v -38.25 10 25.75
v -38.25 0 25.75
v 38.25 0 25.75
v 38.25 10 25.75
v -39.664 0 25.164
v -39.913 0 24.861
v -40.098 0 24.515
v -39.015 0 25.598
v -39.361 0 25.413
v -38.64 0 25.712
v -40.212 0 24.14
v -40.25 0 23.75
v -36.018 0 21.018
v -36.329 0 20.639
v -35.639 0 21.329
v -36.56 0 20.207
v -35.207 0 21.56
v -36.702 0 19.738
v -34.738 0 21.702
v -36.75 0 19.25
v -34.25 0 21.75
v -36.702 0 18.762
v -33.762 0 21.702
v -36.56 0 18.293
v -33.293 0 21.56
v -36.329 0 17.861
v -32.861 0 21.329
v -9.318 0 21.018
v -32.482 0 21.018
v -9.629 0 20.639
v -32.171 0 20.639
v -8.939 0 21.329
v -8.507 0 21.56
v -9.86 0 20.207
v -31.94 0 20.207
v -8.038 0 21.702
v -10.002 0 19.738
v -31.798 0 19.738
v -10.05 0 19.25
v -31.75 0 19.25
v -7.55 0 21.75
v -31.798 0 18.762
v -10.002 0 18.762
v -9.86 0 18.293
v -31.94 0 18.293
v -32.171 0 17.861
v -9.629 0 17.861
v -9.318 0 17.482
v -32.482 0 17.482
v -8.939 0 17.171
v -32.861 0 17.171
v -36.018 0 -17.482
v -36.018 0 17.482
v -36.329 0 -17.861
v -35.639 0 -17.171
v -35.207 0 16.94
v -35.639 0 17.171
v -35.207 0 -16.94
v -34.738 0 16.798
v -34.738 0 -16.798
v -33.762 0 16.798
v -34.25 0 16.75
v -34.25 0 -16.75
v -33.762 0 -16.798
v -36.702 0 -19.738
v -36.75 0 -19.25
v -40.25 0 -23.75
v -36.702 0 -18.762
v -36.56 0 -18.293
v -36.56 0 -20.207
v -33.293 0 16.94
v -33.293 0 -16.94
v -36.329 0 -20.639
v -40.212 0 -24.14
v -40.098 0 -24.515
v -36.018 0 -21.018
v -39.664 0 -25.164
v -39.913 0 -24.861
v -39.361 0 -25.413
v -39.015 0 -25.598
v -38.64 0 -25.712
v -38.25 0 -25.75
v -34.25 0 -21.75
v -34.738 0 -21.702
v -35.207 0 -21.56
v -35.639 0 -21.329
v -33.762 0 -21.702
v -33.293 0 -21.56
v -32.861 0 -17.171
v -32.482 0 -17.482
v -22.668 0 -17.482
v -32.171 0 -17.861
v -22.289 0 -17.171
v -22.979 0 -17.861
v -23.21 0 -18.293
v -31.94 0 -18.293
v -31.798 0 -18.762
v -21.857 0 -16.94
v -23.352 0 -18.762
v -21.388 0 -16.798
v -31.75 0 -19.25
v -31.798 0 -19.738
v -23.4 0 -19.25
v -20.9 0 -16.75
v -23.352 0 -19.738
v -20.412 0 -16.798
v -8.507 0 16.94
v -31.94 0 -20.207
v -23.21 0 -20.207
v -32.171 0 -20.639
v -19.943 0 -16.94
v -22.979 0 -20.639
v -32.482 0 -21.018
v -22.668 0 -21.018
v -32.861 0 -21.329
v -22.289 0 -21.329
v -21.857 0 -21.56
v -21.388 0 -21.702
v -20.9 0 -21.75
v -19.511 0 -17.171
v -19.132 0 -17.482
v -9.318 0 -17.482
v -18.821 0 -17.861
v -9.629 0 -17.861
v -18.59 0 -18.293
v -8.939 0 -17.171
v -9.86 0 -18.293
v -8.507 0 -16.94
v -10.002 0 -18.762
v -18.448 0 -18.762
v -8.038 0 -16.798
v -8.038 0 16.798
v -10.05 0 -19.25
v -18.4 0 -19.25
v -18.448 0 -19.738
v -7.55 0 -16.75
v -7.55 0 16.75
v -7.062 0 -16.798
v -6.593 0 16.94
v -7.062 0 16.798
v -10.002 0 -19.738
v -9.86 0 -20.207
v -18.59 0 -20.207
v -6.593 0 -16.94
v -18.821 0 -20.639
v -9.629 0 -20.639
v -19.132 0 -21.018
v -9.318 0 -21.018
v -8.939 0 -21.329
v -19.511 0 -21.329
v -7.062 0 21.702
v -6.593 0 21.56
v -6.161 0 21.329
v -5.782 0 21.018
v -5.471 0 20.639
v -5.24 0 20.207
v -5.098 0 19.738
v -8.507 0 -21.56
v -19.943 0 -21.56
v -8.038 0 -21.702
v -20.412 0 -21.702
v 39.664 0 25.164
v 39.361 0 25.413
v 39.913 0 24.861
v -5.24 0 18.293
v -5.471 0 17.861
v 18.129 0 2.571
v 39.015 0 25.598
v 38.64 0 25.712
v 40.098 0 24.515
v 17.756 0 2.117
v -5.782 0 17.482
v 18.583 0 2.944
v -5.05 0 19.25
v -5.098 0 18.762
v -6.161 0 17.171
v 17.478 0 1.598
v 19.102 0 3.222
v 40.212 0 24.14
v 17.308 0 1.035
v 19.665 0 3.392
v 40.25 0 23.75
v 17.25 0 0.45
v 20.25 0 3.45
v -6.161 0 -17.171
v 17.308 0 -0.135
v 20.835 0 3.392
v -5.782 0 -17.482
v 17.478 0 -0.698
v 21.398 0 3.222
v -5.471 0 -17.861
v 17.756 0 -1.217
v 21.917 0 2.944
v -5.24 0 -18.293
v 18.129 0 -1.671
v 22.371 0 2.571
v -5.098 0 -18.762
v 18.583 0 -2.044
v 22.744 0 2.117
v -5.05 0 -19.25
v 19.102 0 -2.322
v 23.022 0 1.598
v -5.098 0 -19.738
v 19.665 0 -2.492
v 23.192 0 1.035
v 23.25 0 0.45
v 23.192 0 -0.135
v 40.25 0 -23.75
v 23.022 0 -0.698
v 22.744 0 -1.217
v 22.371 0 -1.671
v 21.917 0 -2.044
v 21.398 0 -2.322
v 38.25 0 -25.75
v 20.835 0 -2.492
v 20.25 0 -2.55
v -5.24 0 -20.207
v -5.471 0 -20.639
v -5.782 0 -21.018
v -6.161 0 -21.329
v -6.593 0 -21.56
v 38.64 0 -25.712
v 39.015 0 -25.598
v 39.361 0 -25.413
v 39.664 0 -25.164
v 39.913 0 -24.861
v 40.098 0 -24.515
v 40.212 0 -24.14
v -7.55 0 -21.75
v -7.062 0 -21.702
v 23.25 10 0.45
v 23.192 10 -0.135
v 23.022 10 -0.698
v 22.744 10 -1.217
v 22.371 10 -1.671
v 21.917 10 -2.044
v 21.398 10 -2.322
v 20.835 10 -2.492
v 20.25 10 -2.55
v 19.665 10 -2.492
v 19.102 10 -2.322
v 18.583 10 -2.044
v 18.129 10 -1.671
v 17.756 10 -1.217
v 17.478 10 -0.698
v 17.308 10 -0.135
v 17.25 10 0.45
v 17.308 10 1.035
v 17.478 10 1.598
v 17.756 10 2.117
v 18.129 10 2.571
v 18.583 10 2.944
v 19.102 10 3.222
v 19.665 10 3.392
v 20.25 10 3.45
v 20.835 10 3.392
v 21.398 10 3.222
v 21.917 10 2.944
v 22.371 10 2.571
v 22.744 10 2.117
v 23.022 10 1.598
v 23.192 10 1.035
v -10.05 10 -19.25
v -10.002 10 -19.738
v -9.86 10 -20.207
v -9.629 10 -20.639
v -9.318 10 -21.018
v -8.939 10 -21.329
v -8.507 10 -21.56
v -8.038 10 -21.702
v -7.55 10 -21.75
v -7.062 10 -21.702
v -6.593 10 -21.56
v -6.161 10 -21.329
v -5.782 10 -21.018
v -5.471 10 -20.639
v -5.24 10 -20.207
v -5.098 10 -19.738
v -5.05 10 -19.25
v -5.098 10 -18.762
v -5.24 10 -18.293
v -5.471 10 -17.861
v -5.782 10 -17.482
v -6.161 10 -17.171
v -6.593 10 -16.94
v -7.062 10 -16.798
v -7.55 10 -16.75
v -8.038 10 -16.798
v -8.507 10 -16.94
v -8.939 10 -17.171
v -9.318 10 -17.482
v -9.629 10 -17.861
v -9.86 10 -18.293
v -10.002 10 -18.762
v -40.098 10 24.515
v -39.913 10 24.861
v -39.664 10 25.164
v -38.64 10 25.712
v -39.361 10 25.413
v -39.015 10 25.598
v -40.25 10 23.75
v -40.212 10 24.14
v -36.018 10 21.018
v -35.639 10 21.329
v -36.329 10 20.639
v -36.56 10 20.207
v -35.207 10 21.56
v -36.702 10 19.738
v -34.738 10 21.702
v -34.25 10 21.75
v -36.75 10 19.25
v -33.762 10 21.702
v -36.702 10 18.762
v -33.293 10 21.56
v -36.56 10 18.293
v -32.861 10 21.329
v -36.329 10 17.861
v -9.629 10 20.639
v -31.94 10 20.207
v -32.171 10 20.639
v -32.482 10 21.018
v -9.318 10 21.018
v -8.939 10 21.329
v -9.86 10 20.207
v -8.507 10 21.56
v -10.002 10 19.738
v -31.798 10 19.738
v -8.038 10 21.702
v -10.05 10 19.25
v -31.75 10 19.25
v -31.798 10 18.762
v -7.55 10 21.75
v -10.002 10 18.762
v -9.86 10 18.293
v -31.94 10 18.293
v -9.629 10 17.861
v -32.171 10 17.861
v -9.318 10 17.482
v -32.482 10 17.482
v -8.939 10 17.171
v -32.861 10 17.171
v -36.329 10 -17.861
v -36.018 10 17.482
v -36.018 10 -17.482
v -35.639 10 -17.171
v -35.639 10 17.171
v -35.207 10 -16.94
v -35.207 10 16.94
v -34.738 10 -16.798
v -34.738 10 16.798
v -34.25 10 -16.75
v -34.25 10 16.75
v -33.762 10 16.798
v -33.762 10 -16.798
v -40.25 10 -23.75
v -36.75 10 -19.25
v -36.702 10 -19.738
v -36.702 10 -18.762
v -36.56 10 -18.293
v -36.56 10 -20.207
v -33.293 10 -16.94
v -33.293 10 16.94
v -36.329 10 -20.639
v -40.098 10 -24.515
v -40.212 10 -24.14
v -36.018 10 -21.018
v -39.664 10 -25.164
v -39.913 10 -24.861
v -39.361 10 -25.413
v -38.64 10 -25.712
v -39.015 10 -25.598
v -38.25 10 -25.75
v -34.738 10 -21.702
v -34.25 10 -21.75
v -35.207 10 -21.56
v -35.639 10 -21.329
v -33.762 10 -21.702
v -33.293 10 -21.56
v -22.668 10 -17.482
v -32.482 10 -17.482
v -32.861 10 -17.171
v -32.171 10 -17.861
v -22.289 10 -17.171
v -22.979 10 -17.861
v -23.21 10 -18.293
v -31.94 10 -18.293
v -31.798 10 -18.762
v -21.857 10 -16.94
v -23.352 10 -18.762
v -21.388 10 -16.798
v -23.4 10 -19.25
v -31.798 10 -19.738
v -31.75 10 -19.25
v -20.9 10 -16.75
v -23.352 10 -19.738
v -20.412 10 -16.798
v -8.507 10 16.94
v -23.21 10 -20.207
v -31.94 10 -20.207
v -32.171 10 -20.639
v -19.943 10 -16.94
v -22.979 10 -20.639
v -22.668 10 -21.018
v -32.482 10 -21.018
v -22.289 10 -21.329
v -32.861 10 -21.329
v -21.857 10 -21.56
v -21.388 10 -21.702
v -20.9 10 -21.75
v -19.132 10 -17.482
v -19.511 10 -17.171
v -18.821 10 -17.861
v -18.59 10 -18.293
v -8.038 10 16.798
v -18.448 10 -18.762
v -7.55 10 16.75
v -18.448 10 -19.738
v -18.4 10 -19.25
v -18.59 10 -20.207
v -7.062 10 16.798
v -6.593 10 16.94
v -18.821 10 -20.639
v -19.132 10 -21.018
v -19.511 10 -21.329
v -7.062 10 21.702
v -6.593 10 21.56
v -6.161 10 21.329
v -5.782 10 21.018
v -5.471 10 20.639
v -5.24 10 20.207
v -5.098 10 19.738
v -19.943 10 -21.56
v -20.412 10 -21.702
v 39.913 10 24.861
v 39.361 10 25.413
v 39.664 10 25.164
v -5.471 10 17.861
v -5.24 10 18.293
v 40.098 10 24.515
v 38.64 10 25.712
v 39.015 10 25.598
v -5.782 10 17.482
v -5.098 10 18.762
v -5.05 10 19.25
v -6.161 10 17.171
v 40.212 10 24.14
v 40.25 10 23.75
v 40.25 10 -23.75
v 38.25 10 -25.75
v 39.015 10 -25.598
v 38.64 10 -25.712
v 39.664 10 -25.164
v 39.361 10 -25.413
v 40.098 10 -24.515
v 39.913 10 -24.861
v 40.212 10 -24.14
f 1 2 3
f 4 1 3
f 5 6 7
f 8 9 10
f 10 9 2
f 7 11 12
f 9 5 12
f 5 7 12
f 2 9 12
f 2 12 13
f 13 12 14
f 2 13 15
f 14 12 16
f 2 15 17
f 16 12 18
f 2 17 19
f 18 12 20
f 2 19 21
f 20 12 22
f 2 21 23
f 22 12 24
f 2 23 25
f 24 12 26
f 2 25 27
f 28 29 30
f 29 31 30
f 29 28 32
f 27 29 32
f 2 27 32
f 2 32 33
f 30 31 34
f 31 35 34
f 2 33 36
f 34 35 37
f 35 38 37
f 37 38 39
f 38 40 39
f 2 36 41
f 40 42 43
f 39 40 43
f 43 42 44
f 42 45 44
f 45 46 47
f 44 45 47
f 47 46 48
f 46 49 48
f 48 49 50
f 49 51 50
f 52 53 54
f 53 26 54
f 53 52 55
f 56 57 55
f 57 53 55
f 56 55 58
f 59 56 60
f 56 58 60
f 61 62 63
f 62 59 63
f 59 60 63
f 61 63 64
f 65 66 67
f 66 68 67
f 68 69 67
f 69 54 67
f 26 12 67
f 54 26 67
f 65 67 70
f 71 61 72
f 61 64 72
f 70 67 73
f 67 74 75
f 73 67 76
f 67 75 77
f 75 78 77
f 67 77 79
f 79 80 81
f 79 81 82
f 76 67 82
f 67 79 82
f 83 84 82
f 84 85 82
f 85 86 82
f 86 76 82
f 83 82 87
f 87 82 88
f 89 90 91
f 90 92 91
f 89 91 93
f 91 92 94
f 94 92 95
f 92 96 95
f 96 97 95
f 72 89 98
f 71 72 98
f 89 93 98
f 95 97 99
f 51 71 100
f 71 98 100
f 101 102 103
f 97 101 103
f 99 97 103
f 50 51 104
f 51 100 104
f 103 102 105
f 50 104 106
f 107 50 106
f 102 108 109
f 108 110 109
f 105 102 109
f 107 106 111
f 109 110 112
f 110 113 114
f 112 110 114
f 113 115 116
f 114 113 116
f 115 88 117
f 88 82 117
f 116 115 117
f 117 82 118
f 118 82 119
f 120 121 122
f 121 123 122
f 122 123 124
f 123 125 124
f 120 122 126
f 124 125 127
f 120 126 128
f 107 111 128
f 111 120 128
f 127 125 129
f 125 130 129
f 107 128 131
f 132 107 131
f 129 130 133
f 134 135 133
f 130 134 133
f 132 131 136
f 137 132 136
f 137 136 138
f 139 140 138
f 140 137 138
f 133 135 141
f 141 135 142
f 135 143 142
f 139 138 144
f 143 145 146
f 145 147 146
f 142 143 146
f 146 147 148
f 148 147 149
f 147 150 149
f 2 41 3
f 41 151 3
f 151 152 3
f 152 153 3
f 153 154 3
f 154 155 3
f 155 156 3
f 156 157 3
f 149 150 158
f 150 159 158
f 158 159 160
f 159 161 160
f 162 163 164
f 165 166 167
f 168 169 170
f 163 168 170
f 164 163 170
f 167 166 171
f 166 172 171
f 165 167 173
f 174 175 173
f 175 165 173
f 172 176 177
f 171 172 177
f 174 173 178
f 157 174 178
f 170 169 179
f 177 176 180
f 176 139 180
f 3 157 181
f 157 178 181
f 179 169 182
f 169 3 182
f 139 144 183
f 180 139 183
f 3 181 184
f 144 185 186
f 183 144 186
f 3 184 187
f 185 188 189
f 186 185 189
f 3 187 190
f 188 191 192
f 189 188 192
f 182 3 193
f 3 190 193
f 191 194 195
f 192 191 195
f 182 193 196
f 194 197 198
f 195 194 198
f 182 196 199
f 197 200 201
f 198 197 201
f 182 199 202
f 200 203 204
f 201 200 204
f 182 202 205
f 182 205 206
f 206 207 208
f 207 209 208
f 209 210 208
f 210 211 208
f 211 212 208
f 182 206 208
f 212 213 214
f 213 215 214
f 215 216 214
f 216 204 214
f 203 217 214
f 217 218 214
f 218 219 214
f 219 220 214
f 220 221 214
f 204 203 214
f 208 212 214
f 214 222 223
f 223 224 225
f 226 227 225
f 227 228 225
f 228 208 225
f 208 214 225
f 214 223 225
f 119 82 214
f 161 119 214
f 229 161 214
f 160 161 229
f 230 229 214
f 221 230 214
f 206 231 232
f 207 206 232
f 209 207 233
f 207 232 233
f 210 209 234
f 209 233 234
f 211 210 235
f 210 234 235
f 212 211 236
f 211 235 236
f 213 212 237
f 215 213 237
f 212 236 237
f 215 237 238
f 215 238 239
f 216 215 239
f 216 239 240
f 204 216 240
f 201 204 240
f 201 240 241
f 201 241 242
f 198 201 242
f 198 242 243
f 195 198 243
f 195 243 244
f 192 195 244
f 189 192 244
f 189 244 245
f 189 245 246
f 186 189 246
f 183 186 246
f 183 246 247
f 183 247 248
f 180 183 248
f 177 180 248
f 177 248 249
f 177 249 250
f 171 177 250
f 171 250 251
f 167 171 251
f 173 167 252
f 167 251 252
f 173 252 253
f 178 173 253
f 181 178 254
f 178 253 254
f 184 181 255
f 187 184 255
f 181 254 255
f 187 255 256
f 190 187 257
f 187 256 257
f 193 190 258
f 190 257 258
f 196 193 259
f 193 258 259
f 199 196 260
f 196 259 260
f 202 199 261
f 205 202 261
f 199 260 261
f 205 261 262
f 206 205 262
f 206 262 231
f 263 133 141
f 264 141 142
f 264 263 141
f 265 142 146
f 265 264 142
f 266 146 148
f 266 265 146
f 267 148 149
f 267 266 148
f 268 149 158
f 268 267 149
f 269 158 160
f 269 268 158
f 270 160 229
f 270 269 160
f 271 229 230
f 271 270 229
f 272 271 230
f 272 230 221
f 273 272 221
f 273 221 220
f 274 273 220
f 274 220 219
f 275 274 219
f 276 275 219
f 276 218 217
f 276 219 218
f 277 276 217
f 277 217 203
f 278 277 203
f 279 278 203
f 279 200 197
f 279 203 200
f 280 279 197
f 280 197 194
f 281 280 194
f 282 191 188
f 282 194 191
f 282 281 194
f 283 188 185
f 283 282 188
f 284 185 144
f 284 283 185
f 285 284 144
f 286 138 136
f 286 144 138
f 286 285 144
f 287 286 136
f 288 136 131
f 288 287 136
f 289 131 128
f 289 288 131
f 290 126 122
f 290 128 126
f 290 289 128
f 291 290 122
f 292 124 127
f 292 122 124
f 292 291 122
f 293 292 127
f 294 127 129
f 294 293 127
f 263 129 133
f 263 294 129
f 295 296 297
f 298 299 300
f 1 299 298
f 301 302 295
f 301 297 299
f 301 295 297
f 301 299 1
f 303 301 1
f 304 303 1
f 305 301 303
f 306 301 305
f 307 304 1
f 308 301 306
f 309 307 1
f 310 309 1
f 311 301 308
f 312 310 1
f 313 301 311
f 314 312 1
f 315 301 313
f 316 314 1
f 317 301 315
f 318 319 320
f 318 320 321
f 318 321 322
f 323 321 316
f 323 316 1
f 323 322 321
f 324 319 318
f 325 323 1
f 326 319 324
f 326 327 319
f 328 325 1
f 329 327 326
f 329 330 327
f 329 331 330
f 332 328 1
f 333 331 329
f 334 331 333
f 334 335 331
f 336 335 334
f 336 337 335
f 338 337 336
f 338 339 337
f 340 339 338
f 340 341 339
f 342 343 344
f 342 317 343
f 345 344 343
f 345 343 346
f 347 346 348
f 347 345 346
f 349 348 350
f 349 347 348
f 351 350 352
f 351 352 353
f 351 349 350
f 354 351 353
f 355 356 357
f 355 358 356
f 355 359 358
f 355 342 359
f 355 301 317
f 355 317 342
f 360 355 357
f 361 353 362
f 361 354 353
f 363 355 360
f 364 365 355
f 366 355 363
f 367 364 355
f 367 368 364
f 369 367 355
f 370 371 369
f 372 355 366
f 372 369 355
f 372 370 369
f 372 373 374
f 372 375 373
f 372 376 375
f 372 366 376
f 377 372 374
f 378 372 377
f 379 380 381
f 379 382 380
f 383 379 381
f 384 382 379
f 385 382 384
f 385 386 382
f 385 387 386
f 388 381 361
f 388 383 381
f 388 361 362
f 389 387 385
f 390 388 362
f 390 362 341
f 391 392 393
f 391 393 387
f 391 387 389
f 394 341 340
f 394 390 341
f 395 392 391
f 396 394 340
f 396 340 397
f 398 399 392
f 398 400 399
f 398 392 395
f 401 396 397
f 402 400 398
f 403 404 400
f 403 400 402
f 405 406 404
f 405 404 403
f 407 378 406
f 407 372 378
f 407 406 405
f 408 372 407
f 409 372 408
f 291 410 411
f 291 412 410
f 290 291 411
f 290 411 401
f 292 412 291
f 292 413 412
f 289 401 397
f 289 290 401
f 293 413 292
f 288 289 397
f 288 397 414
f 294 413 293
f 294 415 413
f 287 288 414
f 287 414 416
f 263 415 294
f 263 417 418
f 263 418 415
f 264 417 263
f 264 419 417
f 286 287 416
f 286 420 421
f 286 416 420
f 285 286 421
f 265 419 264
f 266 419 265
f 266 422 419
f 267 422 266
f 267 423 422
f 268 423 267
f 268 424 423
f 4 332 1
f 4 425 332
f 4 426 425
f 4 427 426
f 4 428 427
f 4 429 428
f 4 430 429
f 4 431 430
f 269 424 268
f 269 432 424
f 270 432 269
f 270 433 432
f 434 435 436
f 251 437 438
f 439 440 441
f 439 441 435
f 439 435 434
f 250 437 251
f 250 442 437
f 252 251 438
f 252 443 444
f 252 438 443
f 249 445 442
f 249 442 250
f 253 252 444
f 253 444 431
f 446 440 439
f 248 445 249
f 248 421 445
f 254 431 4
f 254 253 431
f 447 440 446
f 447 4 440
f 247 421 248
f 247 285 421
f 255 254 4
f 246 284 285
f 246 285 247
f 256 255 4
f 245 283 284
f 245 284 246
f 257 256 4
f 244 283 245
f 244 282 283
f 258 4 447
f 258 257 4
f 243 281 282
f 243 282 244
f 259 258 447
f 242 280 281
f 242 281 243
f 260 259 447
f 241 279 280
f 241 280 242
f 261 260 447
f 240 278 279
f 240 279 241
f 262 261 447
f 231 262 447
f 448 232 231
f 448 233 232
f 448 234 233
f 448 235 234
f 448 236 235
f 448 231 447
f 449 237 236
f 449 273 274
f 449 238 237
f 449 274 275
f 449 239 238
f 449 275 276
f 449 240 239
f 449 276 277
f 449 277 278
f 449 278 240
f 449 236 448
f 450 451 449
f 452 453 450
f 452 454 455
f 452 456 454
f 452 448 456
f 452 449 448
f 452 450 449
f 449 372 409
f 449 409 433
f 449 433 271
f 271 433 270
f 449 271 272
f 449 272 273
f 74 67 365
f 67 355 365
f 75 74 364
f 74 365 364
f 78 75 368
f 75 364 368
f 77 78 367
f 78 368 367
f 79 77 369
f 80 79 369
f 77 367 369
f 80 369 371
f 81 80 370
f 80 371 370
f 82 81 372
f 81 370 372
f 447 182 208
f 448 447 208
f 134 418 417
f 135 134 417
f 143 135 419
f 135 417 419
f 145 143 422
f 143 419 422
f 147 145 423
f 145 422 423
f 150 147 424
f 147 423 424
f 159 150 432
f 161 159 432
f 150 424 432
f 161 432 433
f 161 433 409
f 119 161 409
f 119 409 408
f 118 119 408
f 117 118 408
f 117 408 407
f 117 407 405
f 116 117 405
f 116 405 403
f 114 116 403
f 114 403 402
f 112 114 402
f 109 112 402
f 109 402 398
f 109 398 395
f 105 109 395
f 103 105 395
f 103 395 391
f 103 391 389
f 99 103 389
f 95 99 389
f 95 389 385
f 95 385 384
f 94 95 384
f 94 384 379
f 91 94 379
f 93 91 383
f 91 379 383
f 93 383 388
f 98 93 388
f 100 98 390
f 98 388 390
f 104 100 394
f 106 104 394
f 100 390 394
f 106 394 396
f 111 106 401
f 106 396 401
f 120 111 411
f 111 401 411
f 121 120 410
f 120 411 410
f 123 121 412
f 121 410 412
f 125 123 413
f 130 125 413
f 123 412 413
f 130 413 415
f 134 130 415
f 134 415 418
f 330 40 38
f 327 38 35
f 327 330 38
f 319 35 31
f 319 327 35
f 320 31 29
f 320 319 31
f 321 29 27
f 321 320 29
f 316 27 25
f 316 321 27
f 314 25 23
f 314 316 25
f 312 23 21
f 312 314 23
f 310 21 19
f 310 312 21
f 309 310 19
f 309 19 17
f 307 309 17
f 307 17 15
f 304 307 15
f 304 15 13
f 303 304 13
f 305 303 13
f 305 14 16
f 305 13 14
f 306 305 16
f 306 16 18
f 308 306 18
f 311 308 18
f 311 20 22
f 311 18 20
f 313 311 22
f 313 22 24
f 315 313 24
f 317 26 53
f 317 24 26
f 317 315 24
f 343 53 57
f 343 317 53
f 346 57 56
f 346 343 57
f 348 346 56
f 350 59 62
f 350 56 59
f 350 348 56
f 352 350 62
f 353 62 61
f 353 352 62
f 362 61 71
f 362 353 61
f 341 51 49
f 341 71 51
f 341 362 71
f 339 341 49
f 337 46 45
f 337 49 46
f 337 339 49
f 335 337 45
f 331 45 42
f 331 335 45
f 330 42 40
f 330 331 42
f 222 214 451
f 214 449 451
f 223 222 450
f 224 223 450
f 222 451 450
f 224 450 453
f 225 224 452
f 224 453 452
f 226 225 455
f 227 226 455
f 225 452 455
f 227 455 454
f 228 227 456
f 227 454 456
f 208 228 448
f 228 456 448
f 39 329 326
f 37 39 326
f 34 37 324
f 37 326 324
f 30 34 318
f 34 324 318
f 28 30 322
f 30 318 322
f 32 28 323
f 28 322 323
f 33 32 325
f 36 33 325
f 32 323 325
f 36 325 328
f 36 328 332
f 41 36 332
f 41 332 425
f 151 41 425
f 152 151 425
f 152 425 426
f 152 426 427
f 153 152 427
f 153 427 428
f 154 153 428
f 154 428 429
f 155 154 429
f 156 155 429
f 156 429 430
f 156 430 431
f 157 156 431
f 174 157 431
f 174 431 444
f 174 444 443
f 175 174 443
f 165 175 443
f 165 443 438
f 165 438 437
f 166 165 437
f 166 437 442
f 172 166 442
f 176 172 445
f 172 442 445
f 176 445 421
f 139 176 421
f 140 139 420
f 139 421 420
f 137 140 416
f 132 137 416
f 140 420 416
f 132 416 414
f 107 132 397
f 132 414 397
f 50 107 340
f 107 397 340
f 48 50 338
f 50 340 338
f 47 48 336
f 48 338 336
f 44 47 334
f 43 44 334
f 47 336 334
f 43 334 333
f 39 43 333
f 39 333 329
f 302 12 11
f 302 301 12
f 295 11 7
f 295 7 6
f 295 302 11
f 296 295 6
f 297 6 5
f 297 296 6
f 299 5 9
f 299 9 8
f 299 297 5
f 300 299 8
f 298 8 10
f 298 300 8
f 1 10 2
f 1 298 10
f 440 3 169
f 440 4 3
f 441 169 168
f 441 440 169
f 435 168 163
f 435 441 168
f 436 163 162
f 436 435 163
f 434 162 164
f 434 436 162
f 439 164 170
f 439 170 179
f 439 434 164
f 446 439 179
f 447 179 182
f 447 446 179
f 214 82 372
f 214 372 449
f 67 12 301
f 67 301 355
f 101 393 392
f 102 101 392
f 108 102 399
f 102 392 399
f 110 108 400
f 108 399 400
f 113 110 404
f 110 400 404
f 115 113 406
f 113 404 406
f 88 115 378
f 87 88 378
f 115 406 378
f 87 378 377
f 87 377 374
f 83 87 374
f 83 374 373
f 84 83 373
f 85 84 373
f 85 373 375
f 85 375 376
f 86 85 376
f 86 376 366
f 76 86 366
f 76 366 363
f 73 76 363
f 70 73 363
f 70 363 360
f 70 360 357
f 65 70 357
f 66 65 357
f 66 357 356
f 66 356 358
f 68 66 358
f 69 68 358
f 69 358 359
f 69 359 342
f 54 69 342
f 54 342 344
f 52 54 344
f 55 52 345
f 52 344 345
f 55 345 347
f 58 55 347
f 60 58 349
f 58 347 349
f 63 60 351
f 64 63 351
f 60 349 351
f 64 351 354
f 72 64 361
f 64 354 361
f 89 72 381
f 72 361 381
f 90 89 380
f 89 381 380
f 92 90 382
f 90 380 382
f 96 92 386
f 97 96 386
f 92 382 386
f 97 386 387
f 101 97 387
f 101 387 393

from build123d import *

# Parameters (mm, degrees)
SKETCH1_W               = 80.5
SKETCH1_H               = 51.5
BOSS_EXTRUDE1_DEPTH     = 10
SKETCH2_R               = 2.5
CUT_EXTRUDE1_DEPTH      = 11
MIRROR2_COPY_1_SKETCH_R = 2.5
MIRROR2_COPY_1_DEPTH    = 11
SKETCH3_R               = 2.5
CUT_EXTRUDE2_DEPTH      = 11
SKETCH4_R               = 3
CUT_EXTRUDE3_DEPTH      = 11
FILLET1_R               = 2


with BuildPart() as part:
    # Sketch1 → Boss-Extrude1 (new body)
    with BuildSketch(Plane(origin=(0, 0, 0), x_dir=(1, 0, 0), z_dir=(0, 1, 0))):
        Rectangle(SKETCH1_W, SKETCH1_H)
    extrude(amount=BOSS_EXTRUDE1_DEPTH)

    # Sketch2 → Cut-Extrude1 (cut, through all)
    with BuildSketch(Plane(origin=(0, 10, 0), x_dir=(1, 0, 0), z_dir=(0, 1, 0))):
        with Locations((-34.25, 19.25)):
            Circle(SKETCH2_R)
    cut_extrude1 = extrude(amount=-CUT_EXTRUDE1_DEPTH, mode=Mode.SUBTRACT)

    # Mirror1: Cut-Extrude1 across plane
    add(cut_extrude1.mirror(Plane.ZY.offset(20.9)), mode=Mode.SUBTRACT)

    # Mirror2: Cut-Extrude1 across plane
    add(cut_extrude1.mirror(Plane.XY), mode=Mode.SUBTRACT)

    # Mirror2 copy 1 sketch → Mirror2 copy 1 (cut, through all)
    with BuildSketch(Plane(origin=(-41.8, 10, 0), x_dir=(-1, 0, 0), z_dir=(0, 1, 0))):
        with Locations((-34.25, 19.25)):
            Circle(MIRROR2_COPY_1_SKETCH_R)
    extrude(amount=-MIRROR2_COPY_1_DEPTH, mode=Mode.SUBTRACT)

    # Sketch3 → Cut-Extrude2 (cut, through all)
    with BuildSketch(Plane(origin=(0, 10, 0), x_dir=(1, 0, 0), z_dir=(0, 1, 0))):
        with Locations((-20.9, 19.25)):
            Circle(SKETCH3_R)
    extrude(amount=-CUT_EXTRUDE2_DEPTH, mode=Mode.SUBTRACT)

    # Sketch4 → Cut-Extrude3 (cut, through all)
    with BuildSketch(Plane(origin=(0, 10, 0), x_dir=(1, 0, 0), z_dir=(0, 1, 0))):
        with Locations((20.25, -0.45)):
            Circle(SKETCH4_R)
    extrude(amount=-CUT_EXTRUDE3_DEPTH, mode=Mode.SUBTRACT)

    # Fillet1
    fillet1_edges = [part.edges().sort_by_distance(p)[0] for p in [
        (40.25, 5, 25.75),
        (-40.25, 5, 25.75),
        (-40.25, 5, -25.75),
        (40.25, 5, -25.75),
    ]]
    fillet(fillet1_edges, radius=FILLET1_R)


solid = part.part
